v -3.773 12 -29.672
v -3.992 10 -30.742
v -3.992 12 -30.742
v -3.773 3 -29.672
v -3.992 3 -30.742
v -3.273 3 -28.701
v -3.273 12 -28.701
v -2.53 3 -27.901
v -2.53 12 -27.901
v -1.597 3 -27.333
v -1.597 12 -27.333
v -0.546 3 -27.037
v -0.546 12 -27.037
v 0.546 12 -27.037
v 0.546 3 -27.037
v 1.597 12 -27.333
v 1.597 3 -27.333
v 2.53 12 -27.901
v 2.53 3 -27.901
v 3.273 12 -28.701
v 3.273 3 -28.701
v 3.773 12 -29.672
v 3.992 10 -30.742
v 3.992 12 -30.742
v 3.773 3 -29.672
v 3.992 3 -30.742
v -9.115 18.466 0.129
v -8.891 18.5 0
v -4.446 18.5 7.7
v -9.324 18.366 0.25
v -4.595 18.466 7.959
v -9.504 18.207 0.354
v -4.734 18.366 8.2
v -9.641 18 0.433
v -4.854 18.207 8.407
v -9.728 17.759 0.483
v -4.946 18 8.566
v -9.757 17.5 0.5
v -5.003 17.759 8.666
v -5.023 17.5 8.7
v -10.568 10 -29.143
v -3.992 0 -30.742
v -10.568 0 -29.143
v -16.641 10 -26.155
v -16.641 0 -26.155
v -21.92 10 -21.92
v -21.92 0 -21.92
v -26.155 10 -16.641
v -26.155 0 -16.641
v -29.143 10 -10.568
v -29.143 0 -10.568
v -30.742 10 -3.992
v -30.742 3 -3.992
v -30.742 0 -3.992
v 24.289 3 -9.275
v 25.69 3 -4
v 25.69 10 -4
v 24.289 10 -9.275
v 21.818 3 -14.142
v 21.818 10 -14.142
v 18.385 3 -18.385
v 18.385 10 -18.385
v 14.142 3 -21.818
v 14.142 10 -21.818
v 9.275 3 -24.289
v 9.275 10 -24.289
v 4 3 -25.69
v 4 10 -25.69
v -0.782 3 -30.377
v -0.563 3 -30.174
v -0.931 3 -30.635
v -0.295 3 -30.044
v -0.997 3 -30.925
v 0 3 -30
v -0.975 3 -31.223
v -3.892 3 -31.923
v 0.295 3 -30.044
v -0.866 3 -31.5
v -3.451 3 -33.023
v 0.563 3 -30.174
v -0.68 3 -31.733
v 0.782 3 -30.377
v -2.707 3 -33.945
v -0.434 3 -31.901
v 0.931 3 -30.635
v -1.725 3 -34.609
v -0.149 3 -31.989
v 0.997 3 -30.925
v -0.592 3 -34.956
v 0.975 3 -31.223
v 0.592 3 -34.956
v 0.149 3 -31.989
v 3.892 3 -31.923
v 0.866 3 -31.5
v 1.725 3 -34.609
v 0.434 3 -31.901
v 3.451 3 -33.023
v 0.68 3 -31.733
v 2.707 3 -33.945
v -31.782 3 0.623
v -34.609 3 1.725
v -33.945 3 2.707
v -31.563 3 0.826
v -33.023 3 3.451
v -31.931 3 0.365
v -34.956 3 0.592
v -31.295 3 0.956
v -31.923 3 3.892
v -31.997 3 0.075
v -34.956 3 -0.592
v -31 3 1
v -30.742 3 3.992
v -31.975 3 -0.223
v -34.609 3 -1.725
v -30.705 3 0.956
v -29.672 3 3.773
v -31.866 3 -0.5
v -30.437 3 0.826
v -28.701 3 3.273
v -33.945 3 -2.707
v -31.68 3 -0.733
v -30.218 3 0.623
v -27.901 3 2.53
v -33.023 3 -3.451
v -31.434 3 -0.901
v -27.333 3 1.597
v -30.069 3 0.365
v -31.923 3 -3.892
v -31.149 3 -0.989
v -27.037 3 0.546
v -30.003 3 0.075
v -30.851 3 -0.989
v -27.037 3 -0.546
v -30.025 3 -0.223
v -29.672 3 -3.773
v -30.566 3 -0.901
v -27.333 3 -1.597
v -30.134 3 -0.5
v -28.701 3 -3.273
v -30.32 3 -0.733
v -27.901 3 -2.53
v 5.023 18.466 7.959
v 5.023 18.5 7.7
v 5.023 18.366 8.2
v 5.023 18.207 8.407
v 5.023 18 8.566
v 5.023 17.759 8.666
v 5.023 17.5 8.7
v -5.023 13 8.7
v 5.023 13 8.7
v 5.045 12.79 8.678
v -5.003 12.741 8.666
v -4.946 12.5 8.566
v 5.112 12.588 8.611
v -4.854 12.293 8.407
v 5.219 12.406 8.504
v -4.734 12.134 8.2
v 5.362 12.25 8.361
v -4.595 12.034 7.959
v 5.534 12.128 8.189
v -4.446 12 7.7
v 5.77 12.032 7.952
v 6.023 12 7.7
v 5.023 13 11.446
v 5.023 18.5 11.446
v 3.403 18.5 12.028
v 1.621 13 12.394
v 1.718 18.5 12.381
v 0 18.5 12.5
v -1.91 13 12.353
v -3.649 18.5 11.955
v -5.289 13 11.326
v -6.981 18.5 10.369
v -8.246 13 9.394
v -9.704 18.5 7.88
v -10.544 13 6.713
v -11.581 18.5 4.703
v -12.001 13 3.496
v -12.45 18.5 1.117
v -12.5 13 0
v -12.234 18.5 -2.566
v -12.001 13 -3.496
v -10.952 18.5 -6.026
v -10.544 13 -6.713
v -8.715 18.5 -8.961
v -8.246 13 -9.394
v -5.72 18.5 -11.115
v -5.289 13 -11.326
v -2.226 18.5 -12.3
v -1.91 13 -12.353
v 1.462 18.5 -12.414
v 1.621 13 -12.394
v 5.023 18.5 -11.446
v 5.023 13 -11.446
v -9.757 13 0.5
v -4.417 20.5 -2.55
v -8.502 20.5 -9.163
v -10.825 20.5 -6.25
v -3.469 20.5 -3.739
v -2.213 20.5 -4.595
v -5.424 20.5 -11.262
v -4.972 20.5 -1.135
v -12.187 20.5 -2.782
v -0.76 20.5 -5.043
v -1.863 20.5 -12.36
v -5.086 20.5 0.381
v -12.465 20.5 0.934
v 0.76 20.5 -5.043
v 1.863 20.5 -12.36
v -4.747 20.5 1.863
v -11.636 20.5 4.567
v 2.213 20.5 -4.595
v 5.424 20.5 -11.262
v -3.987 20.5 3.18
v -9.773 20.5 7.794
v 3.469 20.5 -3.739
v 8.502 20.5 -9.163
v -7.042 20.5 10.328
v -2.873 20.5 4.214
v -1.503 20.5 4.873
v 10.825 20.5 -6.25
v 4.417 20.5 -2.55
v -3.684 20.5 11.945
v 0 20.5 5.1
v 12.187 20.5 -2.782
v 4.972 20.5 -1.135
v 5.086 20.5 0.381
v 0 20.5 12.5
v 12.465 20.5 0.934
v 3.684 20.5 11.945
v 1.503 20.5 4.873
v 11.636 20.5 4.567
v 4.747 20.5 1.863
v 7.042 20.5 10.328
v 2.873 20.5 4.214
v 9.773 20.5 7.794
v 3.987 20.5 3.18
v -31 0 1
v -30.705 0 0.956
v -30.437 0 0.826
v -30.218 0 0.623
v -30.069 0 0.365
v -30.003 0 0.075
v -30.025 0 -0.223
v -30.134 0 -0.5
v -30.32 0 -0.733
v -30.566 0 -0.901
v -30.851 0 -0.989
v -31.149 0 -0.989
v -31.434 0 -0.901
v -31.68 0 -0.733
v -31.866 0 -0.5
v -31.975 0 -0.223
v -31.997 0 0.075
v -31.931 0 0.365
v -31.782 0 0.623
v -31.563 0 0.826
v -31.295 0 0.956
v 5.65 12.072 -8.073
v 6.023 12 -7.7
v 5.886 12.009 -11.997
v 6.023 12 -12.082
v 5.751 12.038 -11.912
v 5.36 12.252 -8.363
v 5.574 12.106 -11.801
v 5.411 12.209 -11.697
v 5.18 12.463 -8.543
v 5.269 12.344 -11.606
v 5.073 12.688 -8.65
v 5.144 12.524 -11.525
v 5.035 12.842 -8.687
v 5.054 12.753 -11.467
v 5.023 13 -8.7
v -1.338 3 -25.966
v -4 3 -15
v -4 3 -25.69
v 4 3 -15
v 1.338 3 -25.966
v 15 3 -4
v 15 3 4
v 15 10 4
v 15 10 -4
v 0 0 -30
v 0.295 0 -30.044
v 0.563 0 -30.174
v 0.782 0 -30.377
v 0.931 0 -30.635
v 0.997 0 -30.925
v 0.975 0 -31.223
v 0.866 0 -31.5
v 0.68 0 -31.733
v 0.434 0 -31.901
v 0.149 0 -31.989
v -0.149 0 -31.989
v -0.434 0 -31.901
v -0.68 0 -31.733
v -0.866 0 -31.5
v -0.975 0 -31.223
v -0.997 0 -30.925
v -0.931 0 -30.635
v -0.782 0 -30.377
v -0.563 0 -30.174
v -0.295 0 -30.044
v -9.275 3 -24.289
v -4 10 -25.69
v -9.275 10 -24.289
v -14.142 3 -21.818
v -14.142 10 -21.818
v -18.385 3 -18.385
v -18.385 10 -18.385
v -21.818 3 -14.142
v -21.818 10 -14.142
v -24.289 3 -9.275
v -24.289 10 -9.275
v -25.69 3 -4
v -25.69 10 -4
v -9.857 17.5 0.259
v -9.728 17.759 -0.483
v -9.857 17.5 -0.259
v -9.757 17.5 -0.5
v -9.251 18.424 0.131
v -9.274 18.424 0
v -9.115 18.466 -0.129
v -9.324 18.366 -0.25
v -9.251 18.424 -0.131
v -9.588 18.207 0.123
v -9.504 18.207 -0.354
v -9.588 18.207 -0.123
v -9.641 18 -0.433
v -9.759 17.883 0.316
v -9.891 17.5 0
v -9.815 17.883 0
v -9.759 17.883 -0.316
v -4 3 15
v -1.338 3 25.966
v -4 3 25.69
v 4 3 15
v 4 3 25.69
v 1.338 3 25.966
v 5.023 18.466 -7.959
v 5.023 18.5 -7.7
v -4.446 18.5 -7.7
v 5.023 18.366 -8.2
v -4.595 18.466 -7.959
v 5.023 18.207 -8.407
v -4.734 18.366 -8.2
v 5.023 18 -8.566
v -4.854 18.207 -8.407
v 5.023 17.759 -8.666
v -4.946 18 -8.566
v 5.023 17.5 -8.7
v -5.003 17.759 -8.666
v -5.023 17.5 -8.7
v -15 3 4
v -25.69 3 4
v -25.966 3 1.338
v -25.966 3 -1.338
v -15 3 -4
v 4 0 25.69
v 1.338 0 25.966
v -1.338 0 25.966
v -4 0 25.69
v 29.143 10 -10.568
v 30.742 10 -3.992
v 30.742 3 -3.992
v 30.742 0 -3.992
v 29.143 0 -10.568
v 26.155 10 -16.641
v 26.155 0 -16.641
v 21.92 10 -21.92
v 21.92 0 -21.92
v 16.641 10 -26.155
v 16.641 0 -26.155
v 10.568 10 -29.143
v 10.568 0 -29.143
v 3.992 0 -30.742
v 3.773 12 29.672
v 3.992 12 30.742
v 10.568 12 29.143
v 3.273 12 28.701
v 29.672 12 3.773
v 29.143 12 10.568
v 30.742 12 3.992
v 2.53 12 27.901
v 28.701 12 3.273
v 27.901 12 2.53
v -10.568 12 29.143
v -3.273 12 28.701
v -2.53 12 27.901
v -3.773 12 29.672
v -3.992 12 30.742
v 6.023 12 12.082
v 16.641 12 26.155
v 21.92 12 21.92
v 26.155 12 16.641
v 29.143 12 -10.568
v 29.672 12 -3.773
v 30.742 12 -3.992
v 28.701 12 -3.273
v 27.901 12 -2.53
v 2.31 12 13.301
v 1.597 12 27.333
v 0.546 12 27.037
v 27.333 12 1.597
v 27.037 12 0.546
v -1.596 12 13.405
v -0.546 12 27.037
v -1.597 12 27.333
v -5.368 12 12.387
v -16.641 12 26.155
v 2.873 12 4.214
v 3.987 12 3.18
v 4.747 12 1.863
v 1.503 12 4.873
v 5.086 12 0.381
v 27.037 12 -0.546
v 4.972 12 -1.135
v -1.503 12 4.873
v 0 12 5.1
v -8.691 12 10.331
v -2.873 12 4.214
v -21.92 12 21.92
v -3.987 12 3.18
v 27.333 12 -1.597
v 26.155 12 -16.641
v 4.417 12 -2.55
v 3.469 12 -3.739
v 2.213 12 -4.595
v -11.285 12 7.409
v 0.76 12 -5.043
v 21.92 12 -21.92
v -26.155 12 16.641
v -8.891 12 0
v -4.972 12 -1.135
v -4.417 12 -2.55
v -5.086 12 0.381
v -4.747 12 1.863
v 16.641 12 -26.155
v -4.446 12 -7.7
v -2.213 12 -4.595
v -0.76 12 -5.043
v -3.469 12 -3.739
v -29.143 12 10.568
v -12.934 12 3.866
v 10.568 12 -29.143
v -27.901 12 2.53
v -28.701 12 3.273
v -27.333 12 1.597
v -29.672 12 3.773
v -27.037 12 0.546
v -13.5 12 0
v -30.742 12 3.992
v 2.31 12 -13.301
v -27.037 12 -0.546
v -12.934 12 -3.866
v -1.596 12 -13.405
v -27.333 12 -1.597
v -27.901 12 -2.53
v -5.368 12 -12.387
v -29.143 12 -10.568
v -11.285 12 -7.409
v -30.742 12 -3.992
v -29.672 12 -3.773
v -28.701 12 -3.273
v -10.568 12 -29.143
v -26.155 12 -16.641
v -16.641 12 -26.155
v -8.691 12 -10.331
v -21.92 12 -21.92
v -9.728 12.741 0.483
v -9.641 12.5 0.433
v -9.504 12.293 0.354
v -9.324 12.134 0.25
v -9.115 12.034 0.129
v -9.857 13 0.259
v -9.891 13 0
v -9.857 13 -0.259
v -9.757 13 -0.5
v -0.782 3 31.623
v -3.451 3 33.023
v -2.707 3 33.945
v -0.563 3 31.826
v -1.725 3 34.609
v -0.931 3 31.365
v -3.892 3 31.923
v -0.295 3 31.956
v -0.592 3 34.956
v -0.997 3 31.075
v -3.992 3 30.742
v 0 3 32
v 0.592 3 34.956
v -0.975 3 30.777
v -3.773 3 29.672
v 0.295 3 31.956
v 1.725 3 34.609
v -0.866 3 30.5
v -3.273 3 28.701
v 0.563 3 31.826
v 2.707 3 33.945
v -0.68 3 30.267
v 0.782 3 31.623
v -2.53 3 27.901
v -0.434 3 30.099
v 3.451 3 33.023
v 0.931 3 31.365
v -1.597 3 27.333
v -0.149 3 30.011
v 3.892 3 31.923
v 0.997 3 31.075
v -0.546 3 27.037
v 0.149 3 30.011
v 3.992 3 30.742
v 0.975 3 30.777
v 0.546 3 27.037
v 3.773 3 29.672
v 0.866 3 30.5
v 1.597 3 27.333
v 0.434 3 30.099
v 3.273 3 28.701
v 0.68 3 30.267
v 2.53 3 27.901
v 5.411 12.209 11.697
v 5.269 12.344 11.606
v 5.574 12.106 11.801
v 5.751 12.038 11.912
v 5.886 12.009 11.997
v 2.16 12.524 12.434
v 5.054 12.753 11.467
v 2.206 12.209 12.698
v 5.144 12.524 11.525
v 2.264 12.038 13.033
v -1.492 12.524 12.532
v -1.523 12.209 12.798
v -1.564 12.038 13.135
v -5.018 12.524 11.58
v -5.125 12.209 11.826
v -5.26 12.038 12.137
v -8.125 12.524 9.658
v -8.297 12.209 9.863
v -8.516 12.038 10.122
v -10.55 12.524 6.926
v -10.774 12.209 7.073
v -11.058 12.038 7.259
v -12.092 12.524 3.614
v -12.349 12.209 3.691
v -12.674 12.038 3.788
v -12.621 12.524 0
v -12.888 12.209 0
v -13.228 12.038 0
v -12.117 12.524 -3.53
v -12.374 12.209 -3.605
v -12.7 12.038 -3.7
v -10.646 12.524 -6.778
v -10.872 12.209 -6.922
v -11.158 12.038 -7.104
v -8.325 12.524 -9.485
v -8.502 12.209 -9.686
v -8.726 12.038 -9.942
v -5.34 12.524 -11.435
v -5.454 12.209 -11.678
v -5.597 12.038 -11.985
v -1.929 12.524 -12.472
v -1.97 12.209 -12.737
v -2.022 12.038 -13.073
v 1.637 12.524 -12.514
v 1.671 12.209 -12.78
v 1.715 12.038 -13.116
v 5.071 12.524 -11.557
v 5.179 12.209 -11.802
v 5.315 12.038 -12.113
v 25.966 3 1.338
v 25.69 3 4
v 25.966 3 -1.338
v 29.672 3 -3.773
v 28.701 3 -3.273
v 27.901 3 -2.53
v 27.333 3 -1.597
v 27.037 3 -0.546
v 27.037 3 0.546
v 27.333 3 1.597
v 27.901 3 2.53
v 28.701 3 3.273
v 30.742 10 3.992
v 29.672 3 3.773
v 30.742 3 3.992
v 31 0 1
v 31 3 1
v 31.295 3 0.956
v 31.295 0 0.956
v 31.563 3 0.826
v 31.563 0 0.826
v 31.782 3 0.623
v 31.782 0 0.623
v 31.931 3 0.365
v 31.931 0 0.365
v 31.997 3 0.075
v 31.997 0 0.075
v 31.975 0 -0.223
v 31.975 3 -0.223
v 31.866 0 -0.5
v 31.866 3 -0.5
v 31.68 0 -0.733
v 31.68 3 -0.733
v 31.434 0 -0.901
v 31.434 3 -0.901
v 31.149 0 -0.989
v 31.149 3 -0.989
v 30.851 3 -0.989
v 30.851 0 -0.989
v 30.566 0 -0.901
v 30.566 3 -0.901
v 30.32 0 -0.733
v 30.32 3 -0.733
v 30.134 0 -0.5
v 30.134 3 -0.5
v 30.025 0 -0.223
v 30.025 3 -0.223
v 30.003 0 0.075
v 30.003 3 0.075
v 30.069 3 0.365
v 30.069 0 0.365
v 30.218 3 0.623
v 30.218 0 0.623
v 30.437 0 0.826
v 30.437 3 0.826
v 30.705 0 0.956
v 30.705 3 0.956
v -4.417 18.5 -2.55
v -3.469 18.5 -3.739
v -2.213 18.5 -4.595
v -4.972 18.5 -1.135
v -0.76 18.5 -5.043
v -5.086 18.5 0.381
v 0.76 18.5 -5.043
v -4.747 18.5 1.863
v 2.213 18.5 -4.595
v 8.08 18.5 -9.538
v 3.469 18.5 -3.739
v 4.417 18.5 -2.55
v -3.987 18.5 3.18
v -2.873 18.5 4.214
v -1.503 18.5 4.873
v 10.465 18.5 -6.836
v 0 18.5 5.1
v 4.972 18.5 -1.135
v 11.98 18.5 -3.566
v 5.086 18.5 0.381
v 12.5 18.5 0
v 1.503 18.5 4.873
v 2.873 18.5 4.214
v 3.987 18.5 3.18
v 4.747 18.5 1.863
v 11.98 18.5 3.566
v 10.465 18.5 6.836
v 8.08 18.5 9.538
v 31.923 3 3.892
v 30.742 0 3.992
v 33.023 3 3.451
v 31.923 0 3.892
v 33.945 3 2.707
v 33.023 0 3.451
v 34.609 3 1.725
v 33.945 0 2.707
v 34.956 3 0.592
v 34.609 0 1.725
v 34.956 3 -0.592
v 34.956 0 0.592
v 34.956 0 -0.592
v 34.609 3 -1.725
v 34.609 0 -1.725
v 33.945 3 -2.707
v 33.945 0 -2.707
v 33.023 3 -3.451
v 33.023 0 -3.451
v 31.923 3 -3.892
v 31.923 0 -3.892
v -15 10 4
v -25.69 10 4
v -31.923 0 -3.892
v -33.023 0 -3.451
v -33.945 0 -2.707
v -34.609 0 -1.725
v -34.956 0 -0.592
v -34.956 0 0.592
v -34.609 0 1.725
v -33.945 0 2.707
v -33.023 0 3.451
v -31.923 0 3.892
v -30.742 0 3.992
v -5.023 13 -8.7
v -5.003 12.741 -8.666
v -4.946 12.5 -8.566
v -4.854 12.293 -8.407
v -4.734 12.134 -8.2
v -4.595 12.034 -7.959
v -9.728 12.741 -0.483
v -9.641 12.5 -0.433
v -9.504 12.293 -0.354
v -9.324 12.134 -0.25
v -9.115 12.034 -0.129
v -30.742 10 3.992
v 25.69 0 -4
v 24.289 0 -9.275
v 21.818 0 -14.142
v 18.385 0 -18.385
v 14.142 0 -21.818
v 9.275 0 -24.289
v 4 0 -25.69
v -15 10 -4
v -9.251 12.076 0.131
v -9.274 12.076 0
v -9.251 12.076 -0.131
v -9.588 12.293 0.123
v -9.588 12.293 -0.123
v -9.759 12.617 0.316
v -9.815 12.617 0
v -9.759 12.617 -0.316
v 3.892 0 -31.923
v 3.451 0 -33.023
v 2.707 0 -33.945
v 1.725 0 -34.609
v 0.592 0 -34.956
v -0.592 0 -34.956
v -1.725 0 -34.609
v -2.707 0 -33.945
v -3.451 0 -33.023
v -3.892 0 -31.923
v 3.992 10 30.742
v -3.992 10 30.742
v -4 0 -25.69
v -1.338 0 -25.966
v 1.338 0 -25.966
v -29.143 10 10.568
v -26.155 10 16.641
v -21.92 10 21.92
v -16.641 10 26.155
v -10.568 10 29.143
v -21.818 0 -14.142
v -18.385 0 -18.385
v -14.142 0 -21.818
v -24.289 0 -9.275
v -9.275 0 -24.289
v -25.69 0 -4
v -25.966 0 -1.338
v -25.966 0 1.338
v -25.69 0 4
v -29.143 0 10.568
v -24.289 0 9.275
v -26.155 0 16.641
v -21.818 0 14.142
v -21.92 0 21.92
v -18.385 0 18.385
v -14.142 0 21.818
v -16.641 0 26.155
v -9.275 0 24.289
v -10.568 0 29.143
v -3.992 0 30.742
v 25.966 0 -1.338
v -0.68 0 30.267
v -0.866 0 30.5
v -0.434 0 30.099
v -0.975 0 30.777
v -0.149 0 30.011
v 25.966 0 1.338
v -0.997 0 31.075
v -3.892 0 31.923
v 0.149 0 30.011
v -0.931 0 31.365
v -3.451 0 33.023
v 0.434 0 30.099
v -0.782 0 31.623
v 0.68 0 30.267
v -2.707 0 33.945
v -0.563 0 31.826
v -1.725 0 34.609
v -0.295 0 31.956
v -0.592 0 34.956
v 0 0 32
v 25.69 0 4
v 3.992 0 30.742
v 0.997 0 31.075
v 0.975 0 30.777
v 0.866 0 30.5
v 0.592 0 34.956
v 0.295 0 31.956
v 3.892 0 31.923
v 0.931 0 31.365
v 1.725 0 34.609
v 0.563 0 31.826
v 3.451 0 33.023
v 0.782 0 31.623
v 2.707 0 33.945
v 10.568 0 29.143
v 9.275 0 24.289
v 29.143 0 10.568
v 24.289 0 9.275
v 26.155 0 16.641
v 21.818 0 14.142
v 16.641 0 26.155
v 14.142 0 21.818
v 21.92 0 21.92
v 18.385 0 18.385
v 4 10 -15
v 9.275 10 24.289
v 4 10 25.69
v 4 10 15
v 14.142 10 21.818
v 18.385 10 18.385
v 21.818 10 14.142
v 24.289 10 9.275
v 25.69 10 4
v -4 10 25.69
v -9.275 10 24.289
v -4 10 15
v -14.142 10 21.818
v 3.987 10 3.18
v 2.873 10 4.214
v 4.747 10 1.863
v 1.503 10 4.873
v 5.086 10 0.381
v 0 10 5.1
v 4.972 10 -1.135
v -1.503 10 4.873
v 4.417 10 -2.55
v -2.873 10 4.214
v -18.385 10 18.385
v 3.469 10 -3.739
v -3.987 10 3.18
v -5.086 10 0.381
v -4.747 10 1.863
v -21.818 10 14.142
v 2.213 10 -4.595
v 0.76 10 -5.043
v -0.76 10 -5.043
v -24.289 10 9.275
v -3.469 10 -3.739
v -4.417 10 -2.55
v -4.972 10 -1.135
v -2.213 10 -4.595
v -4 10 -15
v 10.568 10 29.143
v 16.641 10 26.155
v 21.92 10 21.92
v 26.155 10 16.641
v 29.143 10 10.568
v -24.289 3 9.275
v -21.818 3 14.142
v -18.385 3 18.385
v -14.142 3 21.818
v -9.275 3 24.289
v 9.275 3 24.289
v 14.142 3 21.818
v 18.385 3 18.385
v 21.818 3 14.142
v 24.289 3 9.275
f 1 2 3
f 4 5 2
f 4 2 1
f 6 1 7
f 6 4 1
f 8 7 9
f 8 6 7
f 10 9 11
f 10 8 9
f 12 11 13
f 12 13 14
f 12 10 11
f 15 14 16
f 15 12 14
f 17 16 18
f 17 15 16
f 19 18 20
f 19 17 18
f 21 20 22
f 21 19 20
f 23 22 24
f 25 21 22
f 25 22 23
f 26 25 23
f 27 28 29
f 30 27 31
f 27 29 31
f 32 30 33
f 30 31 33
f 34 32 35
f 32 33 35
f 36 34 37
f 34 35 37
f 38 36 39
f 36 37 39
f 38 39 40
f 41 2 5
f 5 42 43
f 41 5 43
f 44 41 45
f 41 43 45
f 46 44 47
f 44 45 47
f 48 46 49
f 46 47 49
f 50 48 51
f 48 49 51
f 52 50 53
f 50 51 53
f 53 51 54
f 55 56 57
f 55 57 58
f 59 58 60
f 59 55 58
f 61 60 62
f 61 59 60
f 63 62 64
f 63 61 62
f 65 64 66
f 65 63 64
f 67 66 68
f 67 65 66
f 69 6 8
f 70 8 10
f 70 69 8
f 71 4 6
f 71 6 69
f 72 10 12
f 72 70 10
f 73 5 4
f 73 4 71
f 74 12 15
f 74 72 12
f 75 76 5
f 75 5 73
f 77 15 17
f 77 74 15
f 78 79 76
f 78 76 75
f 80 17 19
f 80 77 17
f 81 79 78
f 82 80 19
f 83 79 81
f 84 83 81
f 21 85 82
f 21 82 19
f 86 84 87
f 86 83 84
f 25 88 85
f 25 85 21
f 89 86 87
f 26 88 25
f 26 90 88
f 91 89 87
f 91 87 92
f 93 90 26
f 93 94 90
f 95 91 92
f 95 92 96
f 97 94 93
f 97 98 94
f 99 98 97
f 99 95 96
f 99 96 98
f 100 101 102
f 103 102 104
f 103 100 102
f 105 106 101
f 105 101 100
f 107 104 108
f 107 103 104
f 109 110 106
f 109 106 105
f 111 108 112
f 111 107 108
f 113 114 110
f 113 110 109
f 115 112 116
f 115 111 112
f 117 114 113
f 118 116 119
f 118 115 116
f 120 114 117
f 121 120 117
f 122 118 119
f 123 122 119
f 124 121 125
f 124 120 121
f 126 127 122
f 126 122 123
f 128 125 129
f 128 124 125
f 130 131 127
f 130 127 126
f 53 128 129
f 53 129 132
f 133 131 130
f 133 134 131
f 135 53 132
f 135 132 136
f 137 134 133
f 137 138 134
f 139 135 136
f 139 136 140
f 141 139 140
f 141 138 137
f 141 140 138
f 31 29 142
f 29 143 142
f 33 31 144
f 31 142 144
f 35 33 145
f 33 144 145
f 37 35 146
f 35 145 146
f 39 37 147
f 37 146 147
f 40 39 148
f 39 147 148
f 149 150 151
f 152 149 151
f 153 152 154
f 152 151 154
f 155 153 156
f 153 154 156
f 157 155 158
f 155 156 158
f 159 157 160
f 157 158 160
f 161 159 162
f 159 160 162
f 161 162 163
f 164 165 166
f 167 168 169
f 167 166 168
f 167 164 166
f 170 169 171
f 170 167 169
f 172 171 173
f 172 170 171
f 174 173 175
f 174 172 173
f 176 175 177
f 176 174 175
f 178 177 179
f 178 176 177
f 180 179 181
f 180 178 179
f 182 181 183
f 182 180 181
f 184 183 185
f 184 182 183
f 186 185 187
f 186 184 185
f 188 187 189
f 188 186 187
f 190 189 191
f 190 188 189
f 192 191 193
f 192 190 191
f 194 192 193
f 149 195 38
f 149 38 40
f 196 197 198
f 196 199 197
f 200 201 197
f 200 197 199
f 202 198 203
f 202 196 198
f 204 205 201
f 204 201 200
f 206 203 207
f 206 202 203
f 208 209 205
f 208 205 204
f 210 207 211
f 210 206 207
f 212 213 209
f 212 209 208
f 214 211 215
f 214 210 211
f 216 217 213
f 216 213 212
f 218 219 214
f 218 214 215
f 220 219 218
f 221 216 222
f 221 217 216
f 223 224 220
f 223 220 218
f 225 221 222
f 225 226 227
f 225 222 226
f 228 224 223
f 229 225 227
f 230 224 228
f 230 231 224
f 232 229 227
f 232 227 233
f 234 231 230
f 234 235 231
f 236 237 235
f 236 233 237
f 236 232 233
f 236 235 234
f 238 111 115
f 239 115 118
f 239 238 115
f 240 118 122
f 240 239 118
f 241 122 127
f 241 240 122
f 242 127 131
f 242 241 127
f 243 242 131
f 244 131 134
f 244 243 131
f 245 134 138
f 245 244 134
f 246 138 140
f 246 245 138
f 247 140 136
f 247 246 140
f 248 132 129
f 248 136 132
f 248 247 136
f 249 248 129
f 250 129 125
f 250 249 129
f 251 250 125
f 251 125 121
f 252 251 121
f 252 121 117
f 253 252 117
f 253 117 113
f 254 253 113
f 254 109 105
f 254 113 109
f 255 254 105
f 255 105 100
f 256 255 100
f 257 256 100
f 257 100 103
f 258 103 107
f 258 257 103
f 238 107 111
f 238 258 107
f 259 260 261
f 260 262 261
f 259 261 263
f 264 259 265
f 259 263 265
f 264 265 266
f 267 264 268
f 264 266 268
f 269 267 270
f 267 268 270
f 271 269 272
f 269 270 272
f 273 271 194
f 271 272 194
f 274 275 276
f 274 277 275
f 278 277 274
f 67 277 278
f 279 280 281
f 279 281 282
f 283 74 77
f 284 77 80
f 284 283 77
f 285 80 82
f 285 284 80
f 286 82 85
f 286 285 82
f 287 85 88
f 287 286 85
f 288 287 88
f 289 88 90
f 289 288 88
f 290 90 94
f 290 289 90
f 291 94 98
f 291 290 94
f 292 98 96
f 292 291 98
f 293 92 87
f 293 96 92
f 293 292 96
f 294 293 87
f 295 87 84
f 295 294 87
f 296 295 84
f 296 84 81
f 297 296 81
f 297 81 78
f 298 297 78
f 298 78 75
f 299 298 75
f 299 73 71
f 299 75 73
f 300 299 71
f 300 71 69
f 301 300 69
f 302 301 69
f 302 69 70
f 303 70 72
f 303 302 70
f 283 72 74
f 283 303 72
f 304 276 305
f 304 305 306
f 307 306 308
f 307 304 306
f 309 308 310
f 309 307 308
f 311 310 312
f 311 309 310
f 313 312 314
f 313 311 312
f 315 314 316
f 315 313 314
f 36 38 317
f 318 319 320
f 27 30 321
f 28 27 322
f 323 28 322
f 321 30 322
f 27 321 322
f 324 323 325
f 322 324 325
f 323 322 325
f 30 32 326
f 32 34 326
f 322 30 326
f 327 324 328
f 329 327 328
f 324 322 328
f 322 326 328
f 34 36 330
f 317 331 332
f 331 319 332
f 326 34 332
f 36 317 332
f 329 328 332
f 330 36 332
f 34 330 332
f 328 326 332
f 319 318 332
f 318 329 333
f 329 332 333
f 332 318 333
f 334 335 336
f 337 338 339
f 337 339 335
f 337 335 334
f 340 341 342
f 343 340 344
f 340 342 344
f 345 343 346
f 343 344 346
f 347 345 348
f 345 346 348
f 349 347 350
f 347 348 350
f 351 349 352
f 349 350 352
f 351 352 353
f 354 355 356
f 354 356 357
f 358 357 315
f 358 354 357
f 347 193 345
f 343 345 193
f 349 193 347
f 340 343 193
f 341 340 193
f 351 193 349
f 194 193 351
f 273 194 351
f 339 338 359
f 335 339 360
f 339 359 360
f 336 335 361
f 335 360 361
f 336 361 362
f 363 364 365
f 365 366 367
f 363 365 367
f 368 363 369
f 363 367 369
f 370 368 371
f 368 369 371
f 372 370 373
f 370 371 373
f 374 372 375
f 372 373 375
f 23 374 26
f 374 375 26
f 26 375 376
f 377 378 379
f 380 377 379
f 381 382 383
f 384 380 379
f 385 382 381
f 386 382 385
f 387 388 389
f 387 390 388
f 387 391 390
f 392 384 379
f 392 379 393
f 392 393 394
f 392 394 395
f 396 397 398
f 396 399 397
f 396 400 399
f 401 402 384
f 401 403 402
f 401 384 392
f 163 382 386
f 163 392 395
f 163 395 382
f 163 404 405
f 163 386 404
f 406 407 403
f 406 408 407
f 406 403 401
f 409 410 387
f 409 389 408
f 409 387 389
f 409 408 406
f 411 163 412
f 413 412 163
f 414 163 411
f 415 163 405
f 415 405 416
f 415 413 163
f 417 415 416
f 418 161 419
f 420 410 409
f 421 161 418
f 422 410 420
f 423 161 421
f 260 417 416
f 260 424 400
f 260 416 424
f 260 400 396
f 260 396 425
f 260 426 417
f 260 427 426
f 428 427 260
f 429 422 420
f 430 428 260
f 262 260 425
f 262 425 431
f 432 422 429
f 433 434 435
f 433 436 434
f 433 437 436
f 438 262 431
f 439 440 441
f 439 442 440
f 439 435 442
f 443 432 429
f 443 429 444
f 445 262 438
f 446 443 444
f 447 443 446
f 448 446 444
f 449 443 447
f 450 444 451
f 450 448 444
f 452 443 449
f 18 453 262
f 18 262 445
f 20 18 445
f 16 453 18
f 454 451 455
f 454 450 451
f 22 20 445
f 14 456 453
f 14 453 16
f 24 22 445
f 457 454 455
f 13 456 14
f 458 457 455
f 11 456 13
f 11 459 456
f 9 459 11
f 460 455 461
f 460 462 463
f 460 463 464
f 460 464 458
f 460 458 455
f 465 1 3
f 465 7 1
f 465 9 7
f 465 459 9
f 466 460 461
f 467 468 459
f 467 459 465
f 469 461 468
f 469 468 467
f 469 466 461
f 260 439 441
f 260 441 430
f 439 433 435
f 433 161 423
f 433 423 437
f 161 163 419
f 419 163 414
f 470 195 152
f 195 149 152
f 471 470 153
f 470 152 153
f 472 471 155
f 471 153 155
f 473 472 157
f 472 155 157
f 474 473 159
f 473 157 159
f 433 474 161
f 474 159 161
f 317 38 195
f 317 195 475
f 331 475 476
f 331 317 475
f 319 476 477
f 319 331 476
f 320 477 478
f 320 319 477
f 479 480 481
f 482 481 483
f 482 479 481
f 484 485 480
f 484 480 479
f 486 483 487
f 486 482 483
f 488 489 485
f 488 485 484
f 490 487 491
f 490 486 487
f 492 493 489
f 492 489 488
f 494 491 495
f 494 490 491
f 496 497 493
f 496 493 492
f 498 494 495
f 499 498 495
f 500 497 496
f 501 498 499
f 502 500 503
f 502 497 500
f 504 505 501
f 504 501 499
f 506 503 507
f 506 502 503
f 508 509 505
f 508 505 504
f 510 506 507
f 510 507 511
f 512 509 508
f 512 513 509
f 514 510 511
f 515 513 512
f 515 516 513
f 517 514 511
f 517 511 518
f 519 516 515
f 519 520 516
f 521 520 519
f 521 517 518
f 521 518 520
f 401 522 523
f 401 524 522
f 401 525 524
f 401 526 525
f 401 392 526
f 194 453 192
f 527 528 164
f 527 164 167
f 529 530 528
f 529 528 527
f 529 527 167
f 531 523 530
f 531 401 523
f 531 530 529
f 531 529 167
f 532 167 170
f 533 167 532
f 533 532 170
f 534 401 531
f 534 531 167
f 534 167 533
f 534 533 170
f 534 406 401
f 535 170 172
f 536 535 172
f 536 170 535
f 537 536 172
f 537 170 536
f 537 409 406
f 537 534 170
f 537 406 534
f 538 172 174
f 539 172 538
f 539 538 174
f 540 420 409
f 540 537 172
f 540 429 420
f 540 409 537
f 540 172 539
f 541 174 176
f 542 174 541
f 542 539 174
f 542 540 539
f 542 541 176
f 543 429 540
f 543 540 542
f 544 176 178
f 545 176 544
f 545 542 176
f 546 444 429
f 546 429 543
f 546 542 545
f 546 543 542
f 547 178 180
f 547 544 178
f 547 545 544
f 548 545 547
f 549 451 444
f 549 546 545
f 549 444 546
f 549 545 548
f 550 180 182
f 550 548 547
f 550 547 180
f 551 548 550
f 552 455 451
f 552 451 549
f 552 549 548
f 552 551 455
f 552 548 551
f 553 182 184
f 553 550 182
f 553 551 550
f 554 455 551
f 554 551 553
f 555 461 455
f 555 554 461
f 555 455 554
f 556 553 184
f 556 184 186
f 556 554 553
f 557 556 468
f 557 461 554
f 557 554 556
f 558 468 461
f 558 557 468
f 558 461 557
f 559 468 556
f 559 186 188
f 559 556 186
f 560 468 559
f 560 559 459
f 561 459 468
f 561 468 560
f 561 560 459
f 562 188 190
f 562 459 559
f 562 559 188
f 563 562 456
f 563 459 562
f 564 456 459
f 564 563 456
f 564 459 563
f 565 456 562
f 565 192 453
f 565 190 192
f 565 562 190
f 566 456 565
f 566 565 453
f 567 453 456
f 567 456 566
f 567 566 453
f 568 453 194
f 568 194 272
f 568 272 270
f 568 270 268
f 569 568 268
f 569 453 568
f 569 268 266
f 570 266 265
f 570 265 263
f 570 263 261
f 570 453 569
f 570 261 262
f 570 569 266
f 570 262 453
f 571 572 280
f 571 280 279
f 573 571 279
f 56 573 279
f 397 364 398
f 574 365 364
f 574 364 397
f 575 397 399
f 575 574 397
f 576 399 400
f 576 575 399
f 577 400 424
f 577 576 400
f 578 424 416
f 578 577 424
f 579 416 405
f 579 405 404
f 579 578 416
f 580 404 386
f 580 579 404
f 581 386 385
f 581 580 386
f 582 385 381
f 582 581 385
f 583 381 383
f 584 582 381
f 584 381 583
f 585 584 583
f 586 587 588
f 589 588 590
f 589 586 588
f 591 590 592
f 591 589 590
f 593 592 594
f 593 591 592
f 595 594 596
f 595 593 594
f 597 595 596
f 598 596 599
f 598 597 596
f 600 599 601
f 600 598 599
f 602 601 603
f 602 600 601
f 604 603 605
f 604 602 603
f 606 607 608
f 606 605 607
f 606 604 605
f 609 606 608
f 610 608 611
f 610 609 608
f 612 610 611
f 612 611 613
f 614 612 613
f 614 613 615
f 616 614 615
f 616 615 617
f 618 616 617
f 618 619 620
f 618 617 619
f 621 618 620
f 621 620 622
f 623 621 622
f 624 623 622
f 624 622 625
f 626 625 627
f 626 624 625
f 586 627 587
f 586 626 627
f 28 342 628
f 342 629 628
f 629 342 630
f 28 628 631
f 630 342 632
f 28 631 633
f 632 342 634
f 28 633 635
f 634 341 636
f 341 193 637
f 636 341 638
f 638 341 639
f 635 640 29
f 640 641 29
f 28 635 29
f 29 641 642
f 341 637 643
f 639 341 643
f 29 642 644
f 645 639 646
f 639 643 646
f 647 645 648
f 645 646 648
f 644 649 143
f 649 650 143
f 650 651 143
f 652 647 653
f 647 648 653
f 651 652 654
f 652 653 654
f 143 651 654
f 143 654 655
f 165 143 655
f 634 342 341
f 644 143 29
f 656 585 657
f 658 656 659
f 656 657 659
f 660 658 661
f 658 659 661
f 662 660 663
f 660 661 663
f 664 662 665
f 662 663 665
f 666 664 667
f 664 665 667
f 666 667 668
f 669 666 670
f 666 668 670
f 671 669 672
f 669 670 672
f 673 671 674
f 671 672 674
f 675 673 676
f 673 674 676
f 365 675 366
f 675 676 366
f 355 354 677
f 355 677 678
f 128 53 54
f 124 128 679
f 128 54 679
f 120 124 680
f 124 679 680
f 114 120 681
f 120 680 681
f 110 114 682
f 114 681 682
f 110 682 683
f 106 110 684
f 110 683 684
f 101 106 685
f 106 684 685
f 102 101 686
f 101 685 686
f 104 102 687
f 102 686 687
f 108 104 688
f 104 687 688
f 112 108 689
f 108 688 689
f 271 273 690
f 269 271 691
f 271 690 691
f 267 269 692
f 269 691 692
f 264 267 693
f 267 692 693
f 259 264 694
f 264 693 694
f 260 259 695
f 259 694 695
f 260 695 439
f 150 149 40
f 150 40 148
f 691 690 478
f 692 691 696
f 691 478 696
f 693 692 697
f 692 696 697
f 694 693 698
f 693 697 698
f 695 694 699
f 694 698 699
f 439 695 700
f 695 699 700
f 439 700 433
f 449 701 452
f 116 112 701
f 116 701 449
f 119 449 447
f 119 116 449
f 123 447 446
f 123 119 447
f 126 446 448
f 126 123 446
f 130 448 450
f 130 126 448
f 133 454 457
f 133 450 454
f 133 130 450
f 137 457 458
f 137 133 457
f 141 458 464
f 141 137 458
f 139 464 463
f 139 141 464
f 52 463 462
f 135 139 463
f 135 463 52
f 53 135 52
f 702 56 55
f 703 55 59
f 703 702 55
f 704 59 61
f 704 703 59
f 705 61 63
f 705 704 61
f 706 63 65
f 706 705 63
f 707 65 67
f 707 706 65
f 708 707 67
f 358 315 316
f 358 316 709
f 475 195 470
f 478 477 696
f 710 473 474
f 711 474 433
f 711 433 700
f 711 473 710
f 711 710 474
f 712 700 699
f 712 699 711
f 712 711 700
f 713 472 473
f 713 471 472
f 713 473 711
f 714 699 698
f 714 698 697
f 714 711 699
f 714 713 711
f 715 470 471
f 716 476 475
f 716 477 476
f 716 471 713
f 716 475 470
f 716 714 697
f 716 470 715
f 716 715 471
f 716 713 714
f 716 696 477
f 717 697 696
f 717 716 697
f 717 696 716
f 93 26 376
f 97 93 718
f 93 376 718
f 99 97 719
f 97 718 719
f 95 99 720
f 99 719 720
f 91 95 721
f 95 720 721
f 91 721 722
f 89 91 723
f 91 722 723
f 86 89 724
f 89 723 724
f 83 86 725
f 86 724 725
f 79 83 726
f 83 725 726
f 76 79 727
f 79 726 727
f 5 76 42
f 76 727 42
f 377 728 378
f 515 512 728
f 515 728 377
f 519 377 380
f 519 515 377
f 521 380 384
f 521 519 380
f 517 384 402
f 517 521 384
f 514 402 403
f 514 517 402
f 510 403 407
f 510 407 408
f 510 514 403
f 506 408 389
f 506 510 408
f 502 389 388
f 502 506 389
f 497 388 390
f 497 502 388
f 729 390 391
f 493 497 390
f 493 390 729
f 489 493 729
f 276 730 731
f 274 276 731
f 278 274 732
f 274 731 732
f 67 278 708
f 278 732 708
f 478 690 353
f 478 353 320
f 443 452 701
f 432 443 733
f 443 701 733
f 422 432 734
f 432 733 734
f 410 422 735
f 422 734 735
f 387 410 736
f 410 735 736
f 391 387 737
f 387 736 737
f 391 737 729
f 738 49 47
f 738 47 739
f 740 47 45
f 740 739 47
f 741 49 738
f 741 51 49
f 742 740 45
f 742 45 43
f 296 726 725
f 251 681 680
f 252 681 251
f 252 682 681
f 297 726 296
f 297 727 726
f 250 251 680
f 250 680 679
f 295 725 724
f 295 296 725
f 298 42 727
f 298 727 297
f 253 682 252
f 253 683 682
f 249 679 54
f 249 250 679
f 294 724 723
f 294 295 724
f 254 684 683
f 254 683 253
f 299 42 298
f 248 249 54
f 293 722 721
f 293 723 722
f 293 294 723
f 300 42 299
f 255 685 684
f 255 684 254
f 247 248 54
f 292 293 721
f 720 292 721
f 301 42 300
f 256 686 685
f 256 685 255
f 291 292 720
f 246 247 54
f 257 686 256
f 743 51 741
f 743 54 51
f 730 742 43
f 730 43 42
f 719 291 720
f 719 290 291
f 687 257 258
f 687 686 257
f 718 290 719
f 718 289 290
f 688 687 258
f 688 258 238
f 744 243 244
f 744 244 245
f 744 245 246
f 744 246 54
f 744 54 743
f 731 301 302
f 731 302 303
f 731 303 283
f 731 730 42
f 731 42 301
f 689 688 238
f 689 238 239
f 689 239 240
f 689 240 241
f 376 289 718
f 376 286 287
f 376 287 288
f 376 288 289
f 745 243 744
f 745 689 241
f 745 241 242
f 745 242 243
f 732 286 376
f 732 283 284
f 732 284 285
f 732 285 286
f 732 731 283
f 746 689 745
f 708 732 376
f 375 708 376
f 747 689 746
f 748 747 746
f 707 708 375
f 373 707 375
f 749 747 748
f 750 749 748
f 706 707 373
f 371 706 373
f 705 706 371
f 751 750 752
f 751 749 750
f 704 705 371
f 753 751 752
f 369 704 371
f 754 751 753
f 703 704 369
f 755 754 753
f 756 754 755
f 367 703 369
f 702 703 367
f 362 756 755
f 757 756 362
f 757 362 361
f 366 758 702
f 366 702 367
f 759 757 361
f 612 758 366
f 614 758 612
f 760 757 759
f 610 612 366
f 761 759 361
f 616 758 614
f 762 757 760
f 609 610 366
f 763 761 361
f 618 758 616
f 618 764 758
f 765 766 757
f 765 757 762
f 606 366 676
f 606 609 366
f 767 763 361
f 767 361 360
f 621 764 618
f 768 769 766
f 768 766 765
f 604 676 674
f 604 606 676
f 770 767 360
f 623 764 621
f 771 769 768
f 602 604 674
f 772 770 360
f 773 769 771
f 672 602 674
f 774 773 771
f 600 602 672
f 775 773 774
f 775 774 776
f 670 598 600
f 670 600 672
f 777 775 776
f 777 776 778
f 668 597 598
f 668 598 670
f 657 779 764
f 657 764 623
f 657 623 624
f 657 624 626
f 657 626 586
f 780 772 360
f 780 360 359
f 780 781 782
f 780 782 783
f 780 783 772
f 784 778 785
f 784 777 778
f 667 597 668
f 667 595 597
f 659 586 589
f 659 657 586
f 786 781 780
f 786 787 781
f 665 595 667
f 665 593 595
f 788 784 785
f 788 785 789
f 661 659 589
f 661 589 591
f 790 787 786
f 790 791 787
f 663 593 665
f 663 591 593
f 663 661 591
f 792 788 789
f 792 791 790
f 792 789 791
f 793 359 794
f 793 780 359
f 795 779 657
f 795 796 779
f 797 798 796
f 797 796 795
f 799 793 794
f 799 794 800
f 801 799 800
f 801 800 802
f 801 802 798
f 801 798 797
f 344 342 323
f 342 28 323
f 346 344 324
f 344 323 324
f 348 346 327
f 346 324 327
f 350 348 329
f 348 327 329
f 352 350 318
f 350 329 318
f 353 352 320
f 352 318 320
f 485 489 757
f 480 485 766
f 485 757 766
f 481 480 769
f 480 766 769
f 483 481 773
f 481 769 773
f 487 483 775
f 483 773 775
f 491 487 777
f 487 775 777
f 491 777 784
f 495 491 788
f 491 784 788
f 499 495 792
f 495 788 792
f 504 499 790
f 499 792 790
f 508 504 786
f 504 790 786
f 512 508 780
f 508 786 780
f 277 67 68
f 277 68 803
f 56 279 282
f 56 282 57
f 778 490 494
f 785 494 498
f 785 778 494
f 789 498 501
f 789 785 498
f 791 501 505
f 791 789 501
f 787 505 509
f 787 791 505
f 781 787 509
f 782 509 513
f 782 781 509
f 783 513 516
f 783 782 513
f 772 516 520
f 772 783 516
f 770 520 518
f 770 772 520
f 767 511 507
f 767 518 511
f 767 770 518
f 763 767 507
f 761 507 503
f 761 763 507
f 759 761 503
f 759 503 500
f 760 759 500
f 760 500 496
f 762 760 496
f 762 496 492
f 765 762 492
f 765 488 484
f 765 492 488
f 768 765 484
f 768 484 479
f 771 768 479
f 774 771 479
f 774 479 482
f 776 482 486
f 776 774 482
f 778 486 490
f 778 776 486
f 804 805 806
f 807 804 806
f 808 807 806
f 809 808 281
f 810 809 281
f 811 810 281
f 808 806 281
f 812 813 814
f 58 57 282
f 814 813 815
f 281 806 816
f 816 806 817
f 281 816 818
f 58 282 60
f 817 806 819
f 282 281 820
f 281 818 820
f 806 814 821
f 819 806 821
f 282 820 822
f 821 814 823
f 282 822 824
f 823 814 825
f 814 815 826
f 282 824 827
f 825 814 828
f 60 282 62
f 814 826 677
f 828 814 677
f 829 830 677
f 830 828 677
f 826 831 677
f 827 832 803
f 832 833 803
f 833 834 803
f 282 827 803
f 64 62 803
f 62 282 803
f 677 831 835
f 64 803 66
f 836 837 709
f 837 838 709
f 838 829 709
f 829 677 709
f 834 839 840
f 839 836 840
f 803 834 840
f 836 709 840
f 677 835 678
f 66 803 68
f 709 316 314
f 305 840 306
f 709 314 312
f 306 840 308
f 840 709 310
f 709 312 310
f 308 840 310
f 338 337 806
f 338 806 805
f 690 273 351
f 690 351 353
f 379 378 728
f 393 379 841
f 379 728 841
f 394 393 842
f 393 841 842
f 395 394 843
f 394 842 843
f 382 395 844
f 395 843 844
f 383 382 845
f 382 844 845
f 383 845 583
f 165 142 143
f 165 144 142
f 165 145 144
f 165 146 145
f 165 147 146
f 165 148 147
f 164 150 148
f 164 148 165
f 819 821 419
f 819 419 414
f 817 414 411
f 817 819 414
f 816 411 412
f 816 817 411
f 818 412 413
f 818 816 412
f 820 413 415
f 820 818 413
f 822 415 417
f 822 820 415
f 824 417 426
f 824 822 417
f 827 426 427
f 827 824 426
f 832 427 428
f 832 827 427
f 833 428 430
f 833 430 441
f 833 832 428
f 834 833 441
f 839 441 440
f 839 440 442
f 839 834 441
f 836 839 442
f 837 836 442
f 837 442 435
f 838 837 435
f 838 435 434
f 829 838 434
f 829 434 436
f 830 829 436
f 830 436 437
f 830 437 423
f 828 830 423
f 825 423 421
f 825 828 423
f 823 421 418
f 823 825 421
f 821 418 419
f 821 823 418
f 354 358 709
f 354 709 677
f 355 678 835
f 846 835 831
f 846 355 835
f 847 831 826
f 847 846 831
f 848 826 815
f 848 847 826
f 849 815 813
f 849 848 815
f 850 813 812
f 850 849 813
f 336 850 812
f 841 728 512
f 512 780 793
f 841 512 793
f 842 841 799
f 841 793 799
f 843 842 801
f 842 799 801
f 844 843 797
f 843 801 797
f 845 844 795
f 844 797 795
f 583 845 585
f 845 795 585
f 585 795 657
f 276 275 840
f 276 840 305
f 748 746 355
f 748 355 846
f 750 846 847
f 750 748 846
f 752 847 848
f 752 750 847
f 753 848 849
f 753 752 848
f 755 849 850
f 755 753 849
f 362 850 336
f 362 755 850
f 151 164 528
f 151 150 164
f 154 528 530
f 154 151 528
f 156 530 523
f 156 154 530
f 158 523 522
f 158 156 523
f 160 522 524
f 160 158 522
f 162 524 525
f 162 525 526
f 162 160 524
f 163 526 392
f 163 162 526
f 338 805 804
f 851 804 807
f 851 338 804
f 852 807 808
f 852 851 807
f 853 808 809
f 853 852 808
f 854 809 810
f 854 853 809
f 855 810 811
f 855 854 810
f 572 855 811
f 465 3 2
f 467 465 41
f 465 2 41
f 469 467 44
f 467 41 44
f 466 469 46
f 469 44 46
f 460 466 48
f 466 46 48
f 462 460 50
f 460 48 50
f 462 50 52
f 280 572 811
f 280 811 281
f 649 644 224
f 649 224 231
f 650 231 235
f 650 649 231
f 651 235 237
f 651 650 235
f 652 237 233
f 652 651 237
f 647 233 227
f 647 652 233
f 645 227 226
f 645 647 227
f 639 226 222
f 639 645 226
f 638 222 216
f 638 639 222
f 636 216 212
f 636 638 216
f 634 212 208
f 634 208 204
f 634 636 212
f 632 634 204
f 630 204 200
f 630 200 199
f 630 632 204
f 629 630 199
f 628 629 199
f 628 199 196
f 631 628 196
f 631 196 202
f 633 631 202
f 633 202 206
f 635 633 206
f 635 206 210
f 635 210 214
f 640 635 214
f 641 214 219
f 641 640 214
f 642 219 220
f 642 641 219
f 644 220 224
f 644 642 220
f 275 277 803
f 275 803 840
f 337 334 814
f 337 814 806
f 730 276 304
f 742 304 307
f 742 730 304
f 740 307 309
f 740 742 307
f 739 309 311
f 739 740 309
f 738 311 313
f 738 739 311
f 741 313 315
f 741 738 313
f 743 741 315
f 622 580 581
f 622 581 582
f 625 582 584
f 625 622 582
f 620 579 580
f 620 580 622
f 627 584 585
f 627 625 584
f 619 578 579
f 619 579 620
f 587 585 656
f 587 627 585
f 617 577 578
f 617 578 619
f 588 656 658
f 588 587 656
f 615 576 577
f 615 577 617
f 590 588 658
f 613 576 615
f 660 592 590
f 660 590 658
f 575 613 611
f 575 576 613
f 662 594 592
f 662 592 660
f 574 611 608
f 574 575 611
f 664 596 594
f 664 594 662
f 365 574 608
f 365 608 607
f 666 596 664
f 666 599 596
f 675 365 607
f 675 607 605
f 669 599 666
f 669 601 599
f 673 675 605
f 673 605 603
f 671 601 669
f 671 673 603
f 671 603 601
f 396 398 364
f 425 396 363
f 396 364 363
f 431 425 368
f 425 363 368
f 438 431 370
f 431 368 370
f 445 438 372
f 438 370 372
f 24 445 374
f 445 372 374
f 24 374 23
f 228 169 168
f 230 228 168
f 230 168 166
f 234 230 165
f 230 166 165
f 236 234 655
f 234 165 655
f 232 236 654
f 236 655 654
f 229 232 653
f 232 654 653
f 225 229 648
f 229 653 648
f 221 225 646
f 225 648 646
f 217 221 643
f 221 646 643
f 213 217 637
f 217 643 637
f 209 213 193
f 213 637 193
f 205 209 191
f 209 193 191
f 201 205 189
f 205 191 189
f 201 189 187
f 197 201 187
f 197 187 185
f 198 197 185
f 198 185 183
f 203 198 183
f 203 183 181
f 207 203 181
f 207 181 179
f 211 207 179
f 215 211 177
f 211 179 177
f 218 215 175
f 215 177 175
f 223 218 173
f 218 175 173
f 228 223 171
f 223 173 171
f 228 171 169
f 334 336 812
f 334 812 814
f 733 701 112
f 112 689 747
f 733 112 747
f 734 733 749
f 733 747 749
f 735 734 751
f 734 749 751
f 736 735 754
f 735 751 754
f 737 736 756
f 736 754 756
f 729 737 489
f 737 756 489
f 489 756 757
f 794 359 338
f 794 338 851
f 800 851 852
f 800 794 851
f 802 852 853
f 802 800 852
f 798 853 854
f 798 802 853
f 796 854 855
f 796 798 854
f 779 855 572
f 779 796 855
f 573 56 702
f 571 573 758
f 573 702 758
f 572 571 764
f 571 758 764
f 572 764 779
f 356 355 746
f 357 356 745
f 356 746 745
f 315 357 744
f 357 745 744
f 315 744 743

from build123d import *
from build123d.topology import SkipClean

# Parameters (mm, degrees)
SKETCH2_R           = 1
SKETCH2_R_2         = 26
BOSS_EXTRUDE1_DEPTH = 10
SKETCH3_R           = 31
SKETCH3_R_2         = 5.1
BOSS_EXTRUDE2_DEPTH = 2
BOSS_EXTRUDE3_DEPTH = 6.5
SKETCH5_R           = 12.5
SKETCH5_R_2         = 5.1
BOSS_EXTRUDE4_DEPTH = 2
FILLET1_R           = 1
BOSS_EXTRUDE5_START = 6.5
BOSS_EXTRUDE5_DEPTH = 6.5
FILLET2_R           = 1
CUT_EXTRUDE1_START  = -9
SKETCH7_R           = 4
CUT_EXTRUDE1_DEPTH  = 9
BOSS_EXTRUDE6_START = 10
BOSS_EXTRUDE6_DEPTH = 10
CIRPATTERN1_COUNT   = 4
SKETCH12_R          = 26
CUT_EXTRUDE2_DEPTH  = 3


with BuildPart() as part:
    # Sketch2 → Boss-Extrude1 (new body)
    with BuildSketch(Plane(origin=(0, 0, 0), x_dir=(1, 0, 0), z_dir=(0, 1, 0))):
        with BuildLine():
            ThreePointArc((3.991666658, 30.741935484), (0, 35), (-3.991666658, 30.741935484))
            ThreePointArc((-3.991666658, 30.741935484), (-21.920310217, 21.920310217), (-30.741935484, 3.991666658))
            ThreePointArc((-30.741935484, 3.991666658), (-35, 0), (-30.741935484, -3.991666658))
            ThreePointArc((-30.741935484, -3.991666658), (-21.920310217, -21.920310217), (-3.991666658, -30.741935484))
            ThreePointArc((-3.991666658, -30.741935484), (0, -35), (3.991666658, -30.741935484))
            ThreePointArc((3.991666658, -30.741935484), (21.920310217, -21.920310217), (30.741935484, -3.991666658))
            ThreePointArc((30.741935484, -3.991666658), (35, 0), (30.741935484, 3.991666658))
            ThreePointArc((30.741935484, 3.991666658), (21.920310217, 21.920310217), (3.991666658, 30.741935484))
        make_face()
        with Locations(Location((0, 31, 0), (0, 0, 270))):
            Circle(SKETCH2_R, mode=Mode.SUBTRACT)
        with Locations(Location((31, 0, 0), (0, 0, 270))):
            Circle(SKETCH2_R, mode=Mode.SUBTRACT)
        with Locations(Location((0, -31, 0), (0, 0, 270))):
            Circle(SKETCH2_R, mode=Mode.SUBTRACT)
        with Locations(Location((-31, 0, 0), (0, 0, 270))):
            Circle(SKETCH2_R, mode=Mode.SUBTRACT)
        with Locations(Location((0, 0, 0), (0, 0, 270))):
            Circle(SKETCH2_R_2, mode=Mode.SUBTRACT)
    extrude(amount=BOSS_EXTRUDE1_DEPTH)

    # Sketch3 → Boss-Extrude2 (add)
    with BuildSketch(Plane(origin=(0, 10, 0), x_dir=(1, 0, 0), z_dir=(0, 1, 0))):
        with Locations(Location((0, 0, 0), (0, 0, 88.151668903))):
            Circle(SKETCH3_R)
        with Locations(Location((0, 0, 0), (0, 0, 270))):
            Circle(SKETCH3_R_2, mode=Mode.SUBTRACT)
    extrude(amount=BOSS_EXTRUDE2_DEPTH)

    # Sketch4 → Boss-Extrude3 (add)
    with BuildSketch(Plane(origin=(0, 12, 0), x_dir=(1, 0, 0), z_dir=(0, 1, 0))):
        Polygon((-5.022947342, 8.7), (-10.045894684, 0), (-5.022947342, -8.7), (5.022947342, -8.7), (5.022947342, -10.7), (-6.17764788, -10.7), (-12.355295761, 0), (-6.17764788, 10.7), (5.022947342, 10.7), (5.022947342, 8.7), align=None)
    extrude(amount=BOSS_EXTRUDE3_DEPTH)

    # Sketch5 → Boss-Extrude4 (add)
    with BuildSketch(Plane(origin=(0, 18.5, 0), x_dir=(1, 0, 0), z_dir=(0, 1, 0))):
        with Locations(Location((0, 0, 0), (0, 0, 270))):
            Circle(SKETCH5_R)
        with Locations(Location((0, 0, 0), (0, 0, 270))):
            Circle(SKETCH5_R_2, mode=Mode.SUBTRACT)
    extrude(amount=BOSS_EXTRUDE4_DEPTH)

    # Fillet1
    fillet1_edges = [part.edges().sort_by_distance(p)[0] for p in [
        (0, 12, -8.7),
        (0, 12, 8.7),
        (-7.534421013, 12, 4.35),
        (-7.534421013, 12, -4.35),
        (-10.045894684, 15.25, 0),
        (0, 18.5, -8.7),
        (0, 18.5, 8.7),
        (-7.534421013, 18.5, 4.35),
        (-7.534421013, 18.5, -4.35),
    ]]
    fillet(fillet1_edges, radius=FILLET1_R)

    # Sketch6 → Boss-Extrude5 (add)
    with SkipClean():  # the faces are left unmerged after this step: merging them gives an invalid solid
        with BuildSketch(Plane.XZ.offset(-18.5).offset(BOSS_EXTRUDE5_START)):
            with BuildLine():
                Line((-6.17764788, -10.7), (-12.355295761, 0))
                Line((-12.355295761, 0), (-6.17764788, 10.7))
                Line((-6.17764788, 10.7), (5.022947342, 10.7))
                Line((5.022947342, 10.7), (5.022947342, 11.446396813))
                ThreePointArc((5.022947342, 11.446396813), (-12.5, 0), (5.022947342, -11.446396813))
                Line((5.022947342, -11.446396813), (5.022947342, -10.7))
                Line((5.022947342, -10.7), (-6.17764788, -10.7))
            make_face()
        extrude(amount=-BOSS_EXTRUDE5_DEPTH)

    # Fillet2
    fillet2_edges = [part.edges().sort_by_distance(p)[0] for p in [
        (-12.5, 12, 0),
        (5.022947342, 12, -9.2),
        (5.022947342, 12, 9.2),
    ]]
    fillet(fillet2_edges, radius=FILLET2_R)

    # Sketch7 → Cut-Extrude1 (cut)
    with BuildSketch(Plane(origin=(0, 12, 0), x_dir=(1, 0, 0), z_dir=(0, 1, 0)).offset(CUT_EXTRUDE1_START)):
        with Locations((0, -31)):
            Circle(SKETCH7_R)
        with Locations((31, 0)):
            Circle(SKETCH7_R)
        with Locations((0, 31)):
            Circle(SKETCH7_R)
        with Locations((-31, 0)):
            Circle(SKETCH7_R)
    extrude(amount=CUT_EXTRUDE1_DEPTH, mode=Mode.SUBTRACT)

    # Sketch10 → Boss-Extrude6 (add)
    with BuildSketch(Plane.XZ.offset(-10).offset(BOSS_EXTRUDE6_START)):
        with BuildLine():
            Line((-4, 25.690465157), (-4, 15))
            Line((-4, 15), (4, 15))
            Line((4, 15), (4, 25.690465157))
            ThreePointArc((4, 25.690465157), (0, 26), (-4, 25.690465157))
        make_face()
    boss_extrude6 = extrude(amount=-BOSS_EXTRUDE6_DEPTH)

    # CirPattern1: Boss-Extrude6 ×4 about axis
    cirpattern1_axis = Axis((0, 0, 0), (0, 1, 0))
    for i in range(1, CIRPATTERN1_COUNT):
        add(boss_extrude6.rotate(cirpattern1_axis, i * 360 / CIRPATTERN1_COUNT))

    # Sketch12 → Cut-Extrude2 (cut)
    with SkipClean():  # the faces are left unmerged after this step: merging them gives an invalid solid
        with BuildSketch(Plane.XZ):
            with Locations(Location((0, 0, 0), (0, 0, 261.150116902))):
                Circle(SKETCH12_R)
        extrude(amount=-CUT_EXTRUDE2_DEPTH, mode=Mode.SUBTRACT)
    add(part.part.scale(1), mode=Mode.REPLACE)  # the faces are merged on a copy


solid = part.part
